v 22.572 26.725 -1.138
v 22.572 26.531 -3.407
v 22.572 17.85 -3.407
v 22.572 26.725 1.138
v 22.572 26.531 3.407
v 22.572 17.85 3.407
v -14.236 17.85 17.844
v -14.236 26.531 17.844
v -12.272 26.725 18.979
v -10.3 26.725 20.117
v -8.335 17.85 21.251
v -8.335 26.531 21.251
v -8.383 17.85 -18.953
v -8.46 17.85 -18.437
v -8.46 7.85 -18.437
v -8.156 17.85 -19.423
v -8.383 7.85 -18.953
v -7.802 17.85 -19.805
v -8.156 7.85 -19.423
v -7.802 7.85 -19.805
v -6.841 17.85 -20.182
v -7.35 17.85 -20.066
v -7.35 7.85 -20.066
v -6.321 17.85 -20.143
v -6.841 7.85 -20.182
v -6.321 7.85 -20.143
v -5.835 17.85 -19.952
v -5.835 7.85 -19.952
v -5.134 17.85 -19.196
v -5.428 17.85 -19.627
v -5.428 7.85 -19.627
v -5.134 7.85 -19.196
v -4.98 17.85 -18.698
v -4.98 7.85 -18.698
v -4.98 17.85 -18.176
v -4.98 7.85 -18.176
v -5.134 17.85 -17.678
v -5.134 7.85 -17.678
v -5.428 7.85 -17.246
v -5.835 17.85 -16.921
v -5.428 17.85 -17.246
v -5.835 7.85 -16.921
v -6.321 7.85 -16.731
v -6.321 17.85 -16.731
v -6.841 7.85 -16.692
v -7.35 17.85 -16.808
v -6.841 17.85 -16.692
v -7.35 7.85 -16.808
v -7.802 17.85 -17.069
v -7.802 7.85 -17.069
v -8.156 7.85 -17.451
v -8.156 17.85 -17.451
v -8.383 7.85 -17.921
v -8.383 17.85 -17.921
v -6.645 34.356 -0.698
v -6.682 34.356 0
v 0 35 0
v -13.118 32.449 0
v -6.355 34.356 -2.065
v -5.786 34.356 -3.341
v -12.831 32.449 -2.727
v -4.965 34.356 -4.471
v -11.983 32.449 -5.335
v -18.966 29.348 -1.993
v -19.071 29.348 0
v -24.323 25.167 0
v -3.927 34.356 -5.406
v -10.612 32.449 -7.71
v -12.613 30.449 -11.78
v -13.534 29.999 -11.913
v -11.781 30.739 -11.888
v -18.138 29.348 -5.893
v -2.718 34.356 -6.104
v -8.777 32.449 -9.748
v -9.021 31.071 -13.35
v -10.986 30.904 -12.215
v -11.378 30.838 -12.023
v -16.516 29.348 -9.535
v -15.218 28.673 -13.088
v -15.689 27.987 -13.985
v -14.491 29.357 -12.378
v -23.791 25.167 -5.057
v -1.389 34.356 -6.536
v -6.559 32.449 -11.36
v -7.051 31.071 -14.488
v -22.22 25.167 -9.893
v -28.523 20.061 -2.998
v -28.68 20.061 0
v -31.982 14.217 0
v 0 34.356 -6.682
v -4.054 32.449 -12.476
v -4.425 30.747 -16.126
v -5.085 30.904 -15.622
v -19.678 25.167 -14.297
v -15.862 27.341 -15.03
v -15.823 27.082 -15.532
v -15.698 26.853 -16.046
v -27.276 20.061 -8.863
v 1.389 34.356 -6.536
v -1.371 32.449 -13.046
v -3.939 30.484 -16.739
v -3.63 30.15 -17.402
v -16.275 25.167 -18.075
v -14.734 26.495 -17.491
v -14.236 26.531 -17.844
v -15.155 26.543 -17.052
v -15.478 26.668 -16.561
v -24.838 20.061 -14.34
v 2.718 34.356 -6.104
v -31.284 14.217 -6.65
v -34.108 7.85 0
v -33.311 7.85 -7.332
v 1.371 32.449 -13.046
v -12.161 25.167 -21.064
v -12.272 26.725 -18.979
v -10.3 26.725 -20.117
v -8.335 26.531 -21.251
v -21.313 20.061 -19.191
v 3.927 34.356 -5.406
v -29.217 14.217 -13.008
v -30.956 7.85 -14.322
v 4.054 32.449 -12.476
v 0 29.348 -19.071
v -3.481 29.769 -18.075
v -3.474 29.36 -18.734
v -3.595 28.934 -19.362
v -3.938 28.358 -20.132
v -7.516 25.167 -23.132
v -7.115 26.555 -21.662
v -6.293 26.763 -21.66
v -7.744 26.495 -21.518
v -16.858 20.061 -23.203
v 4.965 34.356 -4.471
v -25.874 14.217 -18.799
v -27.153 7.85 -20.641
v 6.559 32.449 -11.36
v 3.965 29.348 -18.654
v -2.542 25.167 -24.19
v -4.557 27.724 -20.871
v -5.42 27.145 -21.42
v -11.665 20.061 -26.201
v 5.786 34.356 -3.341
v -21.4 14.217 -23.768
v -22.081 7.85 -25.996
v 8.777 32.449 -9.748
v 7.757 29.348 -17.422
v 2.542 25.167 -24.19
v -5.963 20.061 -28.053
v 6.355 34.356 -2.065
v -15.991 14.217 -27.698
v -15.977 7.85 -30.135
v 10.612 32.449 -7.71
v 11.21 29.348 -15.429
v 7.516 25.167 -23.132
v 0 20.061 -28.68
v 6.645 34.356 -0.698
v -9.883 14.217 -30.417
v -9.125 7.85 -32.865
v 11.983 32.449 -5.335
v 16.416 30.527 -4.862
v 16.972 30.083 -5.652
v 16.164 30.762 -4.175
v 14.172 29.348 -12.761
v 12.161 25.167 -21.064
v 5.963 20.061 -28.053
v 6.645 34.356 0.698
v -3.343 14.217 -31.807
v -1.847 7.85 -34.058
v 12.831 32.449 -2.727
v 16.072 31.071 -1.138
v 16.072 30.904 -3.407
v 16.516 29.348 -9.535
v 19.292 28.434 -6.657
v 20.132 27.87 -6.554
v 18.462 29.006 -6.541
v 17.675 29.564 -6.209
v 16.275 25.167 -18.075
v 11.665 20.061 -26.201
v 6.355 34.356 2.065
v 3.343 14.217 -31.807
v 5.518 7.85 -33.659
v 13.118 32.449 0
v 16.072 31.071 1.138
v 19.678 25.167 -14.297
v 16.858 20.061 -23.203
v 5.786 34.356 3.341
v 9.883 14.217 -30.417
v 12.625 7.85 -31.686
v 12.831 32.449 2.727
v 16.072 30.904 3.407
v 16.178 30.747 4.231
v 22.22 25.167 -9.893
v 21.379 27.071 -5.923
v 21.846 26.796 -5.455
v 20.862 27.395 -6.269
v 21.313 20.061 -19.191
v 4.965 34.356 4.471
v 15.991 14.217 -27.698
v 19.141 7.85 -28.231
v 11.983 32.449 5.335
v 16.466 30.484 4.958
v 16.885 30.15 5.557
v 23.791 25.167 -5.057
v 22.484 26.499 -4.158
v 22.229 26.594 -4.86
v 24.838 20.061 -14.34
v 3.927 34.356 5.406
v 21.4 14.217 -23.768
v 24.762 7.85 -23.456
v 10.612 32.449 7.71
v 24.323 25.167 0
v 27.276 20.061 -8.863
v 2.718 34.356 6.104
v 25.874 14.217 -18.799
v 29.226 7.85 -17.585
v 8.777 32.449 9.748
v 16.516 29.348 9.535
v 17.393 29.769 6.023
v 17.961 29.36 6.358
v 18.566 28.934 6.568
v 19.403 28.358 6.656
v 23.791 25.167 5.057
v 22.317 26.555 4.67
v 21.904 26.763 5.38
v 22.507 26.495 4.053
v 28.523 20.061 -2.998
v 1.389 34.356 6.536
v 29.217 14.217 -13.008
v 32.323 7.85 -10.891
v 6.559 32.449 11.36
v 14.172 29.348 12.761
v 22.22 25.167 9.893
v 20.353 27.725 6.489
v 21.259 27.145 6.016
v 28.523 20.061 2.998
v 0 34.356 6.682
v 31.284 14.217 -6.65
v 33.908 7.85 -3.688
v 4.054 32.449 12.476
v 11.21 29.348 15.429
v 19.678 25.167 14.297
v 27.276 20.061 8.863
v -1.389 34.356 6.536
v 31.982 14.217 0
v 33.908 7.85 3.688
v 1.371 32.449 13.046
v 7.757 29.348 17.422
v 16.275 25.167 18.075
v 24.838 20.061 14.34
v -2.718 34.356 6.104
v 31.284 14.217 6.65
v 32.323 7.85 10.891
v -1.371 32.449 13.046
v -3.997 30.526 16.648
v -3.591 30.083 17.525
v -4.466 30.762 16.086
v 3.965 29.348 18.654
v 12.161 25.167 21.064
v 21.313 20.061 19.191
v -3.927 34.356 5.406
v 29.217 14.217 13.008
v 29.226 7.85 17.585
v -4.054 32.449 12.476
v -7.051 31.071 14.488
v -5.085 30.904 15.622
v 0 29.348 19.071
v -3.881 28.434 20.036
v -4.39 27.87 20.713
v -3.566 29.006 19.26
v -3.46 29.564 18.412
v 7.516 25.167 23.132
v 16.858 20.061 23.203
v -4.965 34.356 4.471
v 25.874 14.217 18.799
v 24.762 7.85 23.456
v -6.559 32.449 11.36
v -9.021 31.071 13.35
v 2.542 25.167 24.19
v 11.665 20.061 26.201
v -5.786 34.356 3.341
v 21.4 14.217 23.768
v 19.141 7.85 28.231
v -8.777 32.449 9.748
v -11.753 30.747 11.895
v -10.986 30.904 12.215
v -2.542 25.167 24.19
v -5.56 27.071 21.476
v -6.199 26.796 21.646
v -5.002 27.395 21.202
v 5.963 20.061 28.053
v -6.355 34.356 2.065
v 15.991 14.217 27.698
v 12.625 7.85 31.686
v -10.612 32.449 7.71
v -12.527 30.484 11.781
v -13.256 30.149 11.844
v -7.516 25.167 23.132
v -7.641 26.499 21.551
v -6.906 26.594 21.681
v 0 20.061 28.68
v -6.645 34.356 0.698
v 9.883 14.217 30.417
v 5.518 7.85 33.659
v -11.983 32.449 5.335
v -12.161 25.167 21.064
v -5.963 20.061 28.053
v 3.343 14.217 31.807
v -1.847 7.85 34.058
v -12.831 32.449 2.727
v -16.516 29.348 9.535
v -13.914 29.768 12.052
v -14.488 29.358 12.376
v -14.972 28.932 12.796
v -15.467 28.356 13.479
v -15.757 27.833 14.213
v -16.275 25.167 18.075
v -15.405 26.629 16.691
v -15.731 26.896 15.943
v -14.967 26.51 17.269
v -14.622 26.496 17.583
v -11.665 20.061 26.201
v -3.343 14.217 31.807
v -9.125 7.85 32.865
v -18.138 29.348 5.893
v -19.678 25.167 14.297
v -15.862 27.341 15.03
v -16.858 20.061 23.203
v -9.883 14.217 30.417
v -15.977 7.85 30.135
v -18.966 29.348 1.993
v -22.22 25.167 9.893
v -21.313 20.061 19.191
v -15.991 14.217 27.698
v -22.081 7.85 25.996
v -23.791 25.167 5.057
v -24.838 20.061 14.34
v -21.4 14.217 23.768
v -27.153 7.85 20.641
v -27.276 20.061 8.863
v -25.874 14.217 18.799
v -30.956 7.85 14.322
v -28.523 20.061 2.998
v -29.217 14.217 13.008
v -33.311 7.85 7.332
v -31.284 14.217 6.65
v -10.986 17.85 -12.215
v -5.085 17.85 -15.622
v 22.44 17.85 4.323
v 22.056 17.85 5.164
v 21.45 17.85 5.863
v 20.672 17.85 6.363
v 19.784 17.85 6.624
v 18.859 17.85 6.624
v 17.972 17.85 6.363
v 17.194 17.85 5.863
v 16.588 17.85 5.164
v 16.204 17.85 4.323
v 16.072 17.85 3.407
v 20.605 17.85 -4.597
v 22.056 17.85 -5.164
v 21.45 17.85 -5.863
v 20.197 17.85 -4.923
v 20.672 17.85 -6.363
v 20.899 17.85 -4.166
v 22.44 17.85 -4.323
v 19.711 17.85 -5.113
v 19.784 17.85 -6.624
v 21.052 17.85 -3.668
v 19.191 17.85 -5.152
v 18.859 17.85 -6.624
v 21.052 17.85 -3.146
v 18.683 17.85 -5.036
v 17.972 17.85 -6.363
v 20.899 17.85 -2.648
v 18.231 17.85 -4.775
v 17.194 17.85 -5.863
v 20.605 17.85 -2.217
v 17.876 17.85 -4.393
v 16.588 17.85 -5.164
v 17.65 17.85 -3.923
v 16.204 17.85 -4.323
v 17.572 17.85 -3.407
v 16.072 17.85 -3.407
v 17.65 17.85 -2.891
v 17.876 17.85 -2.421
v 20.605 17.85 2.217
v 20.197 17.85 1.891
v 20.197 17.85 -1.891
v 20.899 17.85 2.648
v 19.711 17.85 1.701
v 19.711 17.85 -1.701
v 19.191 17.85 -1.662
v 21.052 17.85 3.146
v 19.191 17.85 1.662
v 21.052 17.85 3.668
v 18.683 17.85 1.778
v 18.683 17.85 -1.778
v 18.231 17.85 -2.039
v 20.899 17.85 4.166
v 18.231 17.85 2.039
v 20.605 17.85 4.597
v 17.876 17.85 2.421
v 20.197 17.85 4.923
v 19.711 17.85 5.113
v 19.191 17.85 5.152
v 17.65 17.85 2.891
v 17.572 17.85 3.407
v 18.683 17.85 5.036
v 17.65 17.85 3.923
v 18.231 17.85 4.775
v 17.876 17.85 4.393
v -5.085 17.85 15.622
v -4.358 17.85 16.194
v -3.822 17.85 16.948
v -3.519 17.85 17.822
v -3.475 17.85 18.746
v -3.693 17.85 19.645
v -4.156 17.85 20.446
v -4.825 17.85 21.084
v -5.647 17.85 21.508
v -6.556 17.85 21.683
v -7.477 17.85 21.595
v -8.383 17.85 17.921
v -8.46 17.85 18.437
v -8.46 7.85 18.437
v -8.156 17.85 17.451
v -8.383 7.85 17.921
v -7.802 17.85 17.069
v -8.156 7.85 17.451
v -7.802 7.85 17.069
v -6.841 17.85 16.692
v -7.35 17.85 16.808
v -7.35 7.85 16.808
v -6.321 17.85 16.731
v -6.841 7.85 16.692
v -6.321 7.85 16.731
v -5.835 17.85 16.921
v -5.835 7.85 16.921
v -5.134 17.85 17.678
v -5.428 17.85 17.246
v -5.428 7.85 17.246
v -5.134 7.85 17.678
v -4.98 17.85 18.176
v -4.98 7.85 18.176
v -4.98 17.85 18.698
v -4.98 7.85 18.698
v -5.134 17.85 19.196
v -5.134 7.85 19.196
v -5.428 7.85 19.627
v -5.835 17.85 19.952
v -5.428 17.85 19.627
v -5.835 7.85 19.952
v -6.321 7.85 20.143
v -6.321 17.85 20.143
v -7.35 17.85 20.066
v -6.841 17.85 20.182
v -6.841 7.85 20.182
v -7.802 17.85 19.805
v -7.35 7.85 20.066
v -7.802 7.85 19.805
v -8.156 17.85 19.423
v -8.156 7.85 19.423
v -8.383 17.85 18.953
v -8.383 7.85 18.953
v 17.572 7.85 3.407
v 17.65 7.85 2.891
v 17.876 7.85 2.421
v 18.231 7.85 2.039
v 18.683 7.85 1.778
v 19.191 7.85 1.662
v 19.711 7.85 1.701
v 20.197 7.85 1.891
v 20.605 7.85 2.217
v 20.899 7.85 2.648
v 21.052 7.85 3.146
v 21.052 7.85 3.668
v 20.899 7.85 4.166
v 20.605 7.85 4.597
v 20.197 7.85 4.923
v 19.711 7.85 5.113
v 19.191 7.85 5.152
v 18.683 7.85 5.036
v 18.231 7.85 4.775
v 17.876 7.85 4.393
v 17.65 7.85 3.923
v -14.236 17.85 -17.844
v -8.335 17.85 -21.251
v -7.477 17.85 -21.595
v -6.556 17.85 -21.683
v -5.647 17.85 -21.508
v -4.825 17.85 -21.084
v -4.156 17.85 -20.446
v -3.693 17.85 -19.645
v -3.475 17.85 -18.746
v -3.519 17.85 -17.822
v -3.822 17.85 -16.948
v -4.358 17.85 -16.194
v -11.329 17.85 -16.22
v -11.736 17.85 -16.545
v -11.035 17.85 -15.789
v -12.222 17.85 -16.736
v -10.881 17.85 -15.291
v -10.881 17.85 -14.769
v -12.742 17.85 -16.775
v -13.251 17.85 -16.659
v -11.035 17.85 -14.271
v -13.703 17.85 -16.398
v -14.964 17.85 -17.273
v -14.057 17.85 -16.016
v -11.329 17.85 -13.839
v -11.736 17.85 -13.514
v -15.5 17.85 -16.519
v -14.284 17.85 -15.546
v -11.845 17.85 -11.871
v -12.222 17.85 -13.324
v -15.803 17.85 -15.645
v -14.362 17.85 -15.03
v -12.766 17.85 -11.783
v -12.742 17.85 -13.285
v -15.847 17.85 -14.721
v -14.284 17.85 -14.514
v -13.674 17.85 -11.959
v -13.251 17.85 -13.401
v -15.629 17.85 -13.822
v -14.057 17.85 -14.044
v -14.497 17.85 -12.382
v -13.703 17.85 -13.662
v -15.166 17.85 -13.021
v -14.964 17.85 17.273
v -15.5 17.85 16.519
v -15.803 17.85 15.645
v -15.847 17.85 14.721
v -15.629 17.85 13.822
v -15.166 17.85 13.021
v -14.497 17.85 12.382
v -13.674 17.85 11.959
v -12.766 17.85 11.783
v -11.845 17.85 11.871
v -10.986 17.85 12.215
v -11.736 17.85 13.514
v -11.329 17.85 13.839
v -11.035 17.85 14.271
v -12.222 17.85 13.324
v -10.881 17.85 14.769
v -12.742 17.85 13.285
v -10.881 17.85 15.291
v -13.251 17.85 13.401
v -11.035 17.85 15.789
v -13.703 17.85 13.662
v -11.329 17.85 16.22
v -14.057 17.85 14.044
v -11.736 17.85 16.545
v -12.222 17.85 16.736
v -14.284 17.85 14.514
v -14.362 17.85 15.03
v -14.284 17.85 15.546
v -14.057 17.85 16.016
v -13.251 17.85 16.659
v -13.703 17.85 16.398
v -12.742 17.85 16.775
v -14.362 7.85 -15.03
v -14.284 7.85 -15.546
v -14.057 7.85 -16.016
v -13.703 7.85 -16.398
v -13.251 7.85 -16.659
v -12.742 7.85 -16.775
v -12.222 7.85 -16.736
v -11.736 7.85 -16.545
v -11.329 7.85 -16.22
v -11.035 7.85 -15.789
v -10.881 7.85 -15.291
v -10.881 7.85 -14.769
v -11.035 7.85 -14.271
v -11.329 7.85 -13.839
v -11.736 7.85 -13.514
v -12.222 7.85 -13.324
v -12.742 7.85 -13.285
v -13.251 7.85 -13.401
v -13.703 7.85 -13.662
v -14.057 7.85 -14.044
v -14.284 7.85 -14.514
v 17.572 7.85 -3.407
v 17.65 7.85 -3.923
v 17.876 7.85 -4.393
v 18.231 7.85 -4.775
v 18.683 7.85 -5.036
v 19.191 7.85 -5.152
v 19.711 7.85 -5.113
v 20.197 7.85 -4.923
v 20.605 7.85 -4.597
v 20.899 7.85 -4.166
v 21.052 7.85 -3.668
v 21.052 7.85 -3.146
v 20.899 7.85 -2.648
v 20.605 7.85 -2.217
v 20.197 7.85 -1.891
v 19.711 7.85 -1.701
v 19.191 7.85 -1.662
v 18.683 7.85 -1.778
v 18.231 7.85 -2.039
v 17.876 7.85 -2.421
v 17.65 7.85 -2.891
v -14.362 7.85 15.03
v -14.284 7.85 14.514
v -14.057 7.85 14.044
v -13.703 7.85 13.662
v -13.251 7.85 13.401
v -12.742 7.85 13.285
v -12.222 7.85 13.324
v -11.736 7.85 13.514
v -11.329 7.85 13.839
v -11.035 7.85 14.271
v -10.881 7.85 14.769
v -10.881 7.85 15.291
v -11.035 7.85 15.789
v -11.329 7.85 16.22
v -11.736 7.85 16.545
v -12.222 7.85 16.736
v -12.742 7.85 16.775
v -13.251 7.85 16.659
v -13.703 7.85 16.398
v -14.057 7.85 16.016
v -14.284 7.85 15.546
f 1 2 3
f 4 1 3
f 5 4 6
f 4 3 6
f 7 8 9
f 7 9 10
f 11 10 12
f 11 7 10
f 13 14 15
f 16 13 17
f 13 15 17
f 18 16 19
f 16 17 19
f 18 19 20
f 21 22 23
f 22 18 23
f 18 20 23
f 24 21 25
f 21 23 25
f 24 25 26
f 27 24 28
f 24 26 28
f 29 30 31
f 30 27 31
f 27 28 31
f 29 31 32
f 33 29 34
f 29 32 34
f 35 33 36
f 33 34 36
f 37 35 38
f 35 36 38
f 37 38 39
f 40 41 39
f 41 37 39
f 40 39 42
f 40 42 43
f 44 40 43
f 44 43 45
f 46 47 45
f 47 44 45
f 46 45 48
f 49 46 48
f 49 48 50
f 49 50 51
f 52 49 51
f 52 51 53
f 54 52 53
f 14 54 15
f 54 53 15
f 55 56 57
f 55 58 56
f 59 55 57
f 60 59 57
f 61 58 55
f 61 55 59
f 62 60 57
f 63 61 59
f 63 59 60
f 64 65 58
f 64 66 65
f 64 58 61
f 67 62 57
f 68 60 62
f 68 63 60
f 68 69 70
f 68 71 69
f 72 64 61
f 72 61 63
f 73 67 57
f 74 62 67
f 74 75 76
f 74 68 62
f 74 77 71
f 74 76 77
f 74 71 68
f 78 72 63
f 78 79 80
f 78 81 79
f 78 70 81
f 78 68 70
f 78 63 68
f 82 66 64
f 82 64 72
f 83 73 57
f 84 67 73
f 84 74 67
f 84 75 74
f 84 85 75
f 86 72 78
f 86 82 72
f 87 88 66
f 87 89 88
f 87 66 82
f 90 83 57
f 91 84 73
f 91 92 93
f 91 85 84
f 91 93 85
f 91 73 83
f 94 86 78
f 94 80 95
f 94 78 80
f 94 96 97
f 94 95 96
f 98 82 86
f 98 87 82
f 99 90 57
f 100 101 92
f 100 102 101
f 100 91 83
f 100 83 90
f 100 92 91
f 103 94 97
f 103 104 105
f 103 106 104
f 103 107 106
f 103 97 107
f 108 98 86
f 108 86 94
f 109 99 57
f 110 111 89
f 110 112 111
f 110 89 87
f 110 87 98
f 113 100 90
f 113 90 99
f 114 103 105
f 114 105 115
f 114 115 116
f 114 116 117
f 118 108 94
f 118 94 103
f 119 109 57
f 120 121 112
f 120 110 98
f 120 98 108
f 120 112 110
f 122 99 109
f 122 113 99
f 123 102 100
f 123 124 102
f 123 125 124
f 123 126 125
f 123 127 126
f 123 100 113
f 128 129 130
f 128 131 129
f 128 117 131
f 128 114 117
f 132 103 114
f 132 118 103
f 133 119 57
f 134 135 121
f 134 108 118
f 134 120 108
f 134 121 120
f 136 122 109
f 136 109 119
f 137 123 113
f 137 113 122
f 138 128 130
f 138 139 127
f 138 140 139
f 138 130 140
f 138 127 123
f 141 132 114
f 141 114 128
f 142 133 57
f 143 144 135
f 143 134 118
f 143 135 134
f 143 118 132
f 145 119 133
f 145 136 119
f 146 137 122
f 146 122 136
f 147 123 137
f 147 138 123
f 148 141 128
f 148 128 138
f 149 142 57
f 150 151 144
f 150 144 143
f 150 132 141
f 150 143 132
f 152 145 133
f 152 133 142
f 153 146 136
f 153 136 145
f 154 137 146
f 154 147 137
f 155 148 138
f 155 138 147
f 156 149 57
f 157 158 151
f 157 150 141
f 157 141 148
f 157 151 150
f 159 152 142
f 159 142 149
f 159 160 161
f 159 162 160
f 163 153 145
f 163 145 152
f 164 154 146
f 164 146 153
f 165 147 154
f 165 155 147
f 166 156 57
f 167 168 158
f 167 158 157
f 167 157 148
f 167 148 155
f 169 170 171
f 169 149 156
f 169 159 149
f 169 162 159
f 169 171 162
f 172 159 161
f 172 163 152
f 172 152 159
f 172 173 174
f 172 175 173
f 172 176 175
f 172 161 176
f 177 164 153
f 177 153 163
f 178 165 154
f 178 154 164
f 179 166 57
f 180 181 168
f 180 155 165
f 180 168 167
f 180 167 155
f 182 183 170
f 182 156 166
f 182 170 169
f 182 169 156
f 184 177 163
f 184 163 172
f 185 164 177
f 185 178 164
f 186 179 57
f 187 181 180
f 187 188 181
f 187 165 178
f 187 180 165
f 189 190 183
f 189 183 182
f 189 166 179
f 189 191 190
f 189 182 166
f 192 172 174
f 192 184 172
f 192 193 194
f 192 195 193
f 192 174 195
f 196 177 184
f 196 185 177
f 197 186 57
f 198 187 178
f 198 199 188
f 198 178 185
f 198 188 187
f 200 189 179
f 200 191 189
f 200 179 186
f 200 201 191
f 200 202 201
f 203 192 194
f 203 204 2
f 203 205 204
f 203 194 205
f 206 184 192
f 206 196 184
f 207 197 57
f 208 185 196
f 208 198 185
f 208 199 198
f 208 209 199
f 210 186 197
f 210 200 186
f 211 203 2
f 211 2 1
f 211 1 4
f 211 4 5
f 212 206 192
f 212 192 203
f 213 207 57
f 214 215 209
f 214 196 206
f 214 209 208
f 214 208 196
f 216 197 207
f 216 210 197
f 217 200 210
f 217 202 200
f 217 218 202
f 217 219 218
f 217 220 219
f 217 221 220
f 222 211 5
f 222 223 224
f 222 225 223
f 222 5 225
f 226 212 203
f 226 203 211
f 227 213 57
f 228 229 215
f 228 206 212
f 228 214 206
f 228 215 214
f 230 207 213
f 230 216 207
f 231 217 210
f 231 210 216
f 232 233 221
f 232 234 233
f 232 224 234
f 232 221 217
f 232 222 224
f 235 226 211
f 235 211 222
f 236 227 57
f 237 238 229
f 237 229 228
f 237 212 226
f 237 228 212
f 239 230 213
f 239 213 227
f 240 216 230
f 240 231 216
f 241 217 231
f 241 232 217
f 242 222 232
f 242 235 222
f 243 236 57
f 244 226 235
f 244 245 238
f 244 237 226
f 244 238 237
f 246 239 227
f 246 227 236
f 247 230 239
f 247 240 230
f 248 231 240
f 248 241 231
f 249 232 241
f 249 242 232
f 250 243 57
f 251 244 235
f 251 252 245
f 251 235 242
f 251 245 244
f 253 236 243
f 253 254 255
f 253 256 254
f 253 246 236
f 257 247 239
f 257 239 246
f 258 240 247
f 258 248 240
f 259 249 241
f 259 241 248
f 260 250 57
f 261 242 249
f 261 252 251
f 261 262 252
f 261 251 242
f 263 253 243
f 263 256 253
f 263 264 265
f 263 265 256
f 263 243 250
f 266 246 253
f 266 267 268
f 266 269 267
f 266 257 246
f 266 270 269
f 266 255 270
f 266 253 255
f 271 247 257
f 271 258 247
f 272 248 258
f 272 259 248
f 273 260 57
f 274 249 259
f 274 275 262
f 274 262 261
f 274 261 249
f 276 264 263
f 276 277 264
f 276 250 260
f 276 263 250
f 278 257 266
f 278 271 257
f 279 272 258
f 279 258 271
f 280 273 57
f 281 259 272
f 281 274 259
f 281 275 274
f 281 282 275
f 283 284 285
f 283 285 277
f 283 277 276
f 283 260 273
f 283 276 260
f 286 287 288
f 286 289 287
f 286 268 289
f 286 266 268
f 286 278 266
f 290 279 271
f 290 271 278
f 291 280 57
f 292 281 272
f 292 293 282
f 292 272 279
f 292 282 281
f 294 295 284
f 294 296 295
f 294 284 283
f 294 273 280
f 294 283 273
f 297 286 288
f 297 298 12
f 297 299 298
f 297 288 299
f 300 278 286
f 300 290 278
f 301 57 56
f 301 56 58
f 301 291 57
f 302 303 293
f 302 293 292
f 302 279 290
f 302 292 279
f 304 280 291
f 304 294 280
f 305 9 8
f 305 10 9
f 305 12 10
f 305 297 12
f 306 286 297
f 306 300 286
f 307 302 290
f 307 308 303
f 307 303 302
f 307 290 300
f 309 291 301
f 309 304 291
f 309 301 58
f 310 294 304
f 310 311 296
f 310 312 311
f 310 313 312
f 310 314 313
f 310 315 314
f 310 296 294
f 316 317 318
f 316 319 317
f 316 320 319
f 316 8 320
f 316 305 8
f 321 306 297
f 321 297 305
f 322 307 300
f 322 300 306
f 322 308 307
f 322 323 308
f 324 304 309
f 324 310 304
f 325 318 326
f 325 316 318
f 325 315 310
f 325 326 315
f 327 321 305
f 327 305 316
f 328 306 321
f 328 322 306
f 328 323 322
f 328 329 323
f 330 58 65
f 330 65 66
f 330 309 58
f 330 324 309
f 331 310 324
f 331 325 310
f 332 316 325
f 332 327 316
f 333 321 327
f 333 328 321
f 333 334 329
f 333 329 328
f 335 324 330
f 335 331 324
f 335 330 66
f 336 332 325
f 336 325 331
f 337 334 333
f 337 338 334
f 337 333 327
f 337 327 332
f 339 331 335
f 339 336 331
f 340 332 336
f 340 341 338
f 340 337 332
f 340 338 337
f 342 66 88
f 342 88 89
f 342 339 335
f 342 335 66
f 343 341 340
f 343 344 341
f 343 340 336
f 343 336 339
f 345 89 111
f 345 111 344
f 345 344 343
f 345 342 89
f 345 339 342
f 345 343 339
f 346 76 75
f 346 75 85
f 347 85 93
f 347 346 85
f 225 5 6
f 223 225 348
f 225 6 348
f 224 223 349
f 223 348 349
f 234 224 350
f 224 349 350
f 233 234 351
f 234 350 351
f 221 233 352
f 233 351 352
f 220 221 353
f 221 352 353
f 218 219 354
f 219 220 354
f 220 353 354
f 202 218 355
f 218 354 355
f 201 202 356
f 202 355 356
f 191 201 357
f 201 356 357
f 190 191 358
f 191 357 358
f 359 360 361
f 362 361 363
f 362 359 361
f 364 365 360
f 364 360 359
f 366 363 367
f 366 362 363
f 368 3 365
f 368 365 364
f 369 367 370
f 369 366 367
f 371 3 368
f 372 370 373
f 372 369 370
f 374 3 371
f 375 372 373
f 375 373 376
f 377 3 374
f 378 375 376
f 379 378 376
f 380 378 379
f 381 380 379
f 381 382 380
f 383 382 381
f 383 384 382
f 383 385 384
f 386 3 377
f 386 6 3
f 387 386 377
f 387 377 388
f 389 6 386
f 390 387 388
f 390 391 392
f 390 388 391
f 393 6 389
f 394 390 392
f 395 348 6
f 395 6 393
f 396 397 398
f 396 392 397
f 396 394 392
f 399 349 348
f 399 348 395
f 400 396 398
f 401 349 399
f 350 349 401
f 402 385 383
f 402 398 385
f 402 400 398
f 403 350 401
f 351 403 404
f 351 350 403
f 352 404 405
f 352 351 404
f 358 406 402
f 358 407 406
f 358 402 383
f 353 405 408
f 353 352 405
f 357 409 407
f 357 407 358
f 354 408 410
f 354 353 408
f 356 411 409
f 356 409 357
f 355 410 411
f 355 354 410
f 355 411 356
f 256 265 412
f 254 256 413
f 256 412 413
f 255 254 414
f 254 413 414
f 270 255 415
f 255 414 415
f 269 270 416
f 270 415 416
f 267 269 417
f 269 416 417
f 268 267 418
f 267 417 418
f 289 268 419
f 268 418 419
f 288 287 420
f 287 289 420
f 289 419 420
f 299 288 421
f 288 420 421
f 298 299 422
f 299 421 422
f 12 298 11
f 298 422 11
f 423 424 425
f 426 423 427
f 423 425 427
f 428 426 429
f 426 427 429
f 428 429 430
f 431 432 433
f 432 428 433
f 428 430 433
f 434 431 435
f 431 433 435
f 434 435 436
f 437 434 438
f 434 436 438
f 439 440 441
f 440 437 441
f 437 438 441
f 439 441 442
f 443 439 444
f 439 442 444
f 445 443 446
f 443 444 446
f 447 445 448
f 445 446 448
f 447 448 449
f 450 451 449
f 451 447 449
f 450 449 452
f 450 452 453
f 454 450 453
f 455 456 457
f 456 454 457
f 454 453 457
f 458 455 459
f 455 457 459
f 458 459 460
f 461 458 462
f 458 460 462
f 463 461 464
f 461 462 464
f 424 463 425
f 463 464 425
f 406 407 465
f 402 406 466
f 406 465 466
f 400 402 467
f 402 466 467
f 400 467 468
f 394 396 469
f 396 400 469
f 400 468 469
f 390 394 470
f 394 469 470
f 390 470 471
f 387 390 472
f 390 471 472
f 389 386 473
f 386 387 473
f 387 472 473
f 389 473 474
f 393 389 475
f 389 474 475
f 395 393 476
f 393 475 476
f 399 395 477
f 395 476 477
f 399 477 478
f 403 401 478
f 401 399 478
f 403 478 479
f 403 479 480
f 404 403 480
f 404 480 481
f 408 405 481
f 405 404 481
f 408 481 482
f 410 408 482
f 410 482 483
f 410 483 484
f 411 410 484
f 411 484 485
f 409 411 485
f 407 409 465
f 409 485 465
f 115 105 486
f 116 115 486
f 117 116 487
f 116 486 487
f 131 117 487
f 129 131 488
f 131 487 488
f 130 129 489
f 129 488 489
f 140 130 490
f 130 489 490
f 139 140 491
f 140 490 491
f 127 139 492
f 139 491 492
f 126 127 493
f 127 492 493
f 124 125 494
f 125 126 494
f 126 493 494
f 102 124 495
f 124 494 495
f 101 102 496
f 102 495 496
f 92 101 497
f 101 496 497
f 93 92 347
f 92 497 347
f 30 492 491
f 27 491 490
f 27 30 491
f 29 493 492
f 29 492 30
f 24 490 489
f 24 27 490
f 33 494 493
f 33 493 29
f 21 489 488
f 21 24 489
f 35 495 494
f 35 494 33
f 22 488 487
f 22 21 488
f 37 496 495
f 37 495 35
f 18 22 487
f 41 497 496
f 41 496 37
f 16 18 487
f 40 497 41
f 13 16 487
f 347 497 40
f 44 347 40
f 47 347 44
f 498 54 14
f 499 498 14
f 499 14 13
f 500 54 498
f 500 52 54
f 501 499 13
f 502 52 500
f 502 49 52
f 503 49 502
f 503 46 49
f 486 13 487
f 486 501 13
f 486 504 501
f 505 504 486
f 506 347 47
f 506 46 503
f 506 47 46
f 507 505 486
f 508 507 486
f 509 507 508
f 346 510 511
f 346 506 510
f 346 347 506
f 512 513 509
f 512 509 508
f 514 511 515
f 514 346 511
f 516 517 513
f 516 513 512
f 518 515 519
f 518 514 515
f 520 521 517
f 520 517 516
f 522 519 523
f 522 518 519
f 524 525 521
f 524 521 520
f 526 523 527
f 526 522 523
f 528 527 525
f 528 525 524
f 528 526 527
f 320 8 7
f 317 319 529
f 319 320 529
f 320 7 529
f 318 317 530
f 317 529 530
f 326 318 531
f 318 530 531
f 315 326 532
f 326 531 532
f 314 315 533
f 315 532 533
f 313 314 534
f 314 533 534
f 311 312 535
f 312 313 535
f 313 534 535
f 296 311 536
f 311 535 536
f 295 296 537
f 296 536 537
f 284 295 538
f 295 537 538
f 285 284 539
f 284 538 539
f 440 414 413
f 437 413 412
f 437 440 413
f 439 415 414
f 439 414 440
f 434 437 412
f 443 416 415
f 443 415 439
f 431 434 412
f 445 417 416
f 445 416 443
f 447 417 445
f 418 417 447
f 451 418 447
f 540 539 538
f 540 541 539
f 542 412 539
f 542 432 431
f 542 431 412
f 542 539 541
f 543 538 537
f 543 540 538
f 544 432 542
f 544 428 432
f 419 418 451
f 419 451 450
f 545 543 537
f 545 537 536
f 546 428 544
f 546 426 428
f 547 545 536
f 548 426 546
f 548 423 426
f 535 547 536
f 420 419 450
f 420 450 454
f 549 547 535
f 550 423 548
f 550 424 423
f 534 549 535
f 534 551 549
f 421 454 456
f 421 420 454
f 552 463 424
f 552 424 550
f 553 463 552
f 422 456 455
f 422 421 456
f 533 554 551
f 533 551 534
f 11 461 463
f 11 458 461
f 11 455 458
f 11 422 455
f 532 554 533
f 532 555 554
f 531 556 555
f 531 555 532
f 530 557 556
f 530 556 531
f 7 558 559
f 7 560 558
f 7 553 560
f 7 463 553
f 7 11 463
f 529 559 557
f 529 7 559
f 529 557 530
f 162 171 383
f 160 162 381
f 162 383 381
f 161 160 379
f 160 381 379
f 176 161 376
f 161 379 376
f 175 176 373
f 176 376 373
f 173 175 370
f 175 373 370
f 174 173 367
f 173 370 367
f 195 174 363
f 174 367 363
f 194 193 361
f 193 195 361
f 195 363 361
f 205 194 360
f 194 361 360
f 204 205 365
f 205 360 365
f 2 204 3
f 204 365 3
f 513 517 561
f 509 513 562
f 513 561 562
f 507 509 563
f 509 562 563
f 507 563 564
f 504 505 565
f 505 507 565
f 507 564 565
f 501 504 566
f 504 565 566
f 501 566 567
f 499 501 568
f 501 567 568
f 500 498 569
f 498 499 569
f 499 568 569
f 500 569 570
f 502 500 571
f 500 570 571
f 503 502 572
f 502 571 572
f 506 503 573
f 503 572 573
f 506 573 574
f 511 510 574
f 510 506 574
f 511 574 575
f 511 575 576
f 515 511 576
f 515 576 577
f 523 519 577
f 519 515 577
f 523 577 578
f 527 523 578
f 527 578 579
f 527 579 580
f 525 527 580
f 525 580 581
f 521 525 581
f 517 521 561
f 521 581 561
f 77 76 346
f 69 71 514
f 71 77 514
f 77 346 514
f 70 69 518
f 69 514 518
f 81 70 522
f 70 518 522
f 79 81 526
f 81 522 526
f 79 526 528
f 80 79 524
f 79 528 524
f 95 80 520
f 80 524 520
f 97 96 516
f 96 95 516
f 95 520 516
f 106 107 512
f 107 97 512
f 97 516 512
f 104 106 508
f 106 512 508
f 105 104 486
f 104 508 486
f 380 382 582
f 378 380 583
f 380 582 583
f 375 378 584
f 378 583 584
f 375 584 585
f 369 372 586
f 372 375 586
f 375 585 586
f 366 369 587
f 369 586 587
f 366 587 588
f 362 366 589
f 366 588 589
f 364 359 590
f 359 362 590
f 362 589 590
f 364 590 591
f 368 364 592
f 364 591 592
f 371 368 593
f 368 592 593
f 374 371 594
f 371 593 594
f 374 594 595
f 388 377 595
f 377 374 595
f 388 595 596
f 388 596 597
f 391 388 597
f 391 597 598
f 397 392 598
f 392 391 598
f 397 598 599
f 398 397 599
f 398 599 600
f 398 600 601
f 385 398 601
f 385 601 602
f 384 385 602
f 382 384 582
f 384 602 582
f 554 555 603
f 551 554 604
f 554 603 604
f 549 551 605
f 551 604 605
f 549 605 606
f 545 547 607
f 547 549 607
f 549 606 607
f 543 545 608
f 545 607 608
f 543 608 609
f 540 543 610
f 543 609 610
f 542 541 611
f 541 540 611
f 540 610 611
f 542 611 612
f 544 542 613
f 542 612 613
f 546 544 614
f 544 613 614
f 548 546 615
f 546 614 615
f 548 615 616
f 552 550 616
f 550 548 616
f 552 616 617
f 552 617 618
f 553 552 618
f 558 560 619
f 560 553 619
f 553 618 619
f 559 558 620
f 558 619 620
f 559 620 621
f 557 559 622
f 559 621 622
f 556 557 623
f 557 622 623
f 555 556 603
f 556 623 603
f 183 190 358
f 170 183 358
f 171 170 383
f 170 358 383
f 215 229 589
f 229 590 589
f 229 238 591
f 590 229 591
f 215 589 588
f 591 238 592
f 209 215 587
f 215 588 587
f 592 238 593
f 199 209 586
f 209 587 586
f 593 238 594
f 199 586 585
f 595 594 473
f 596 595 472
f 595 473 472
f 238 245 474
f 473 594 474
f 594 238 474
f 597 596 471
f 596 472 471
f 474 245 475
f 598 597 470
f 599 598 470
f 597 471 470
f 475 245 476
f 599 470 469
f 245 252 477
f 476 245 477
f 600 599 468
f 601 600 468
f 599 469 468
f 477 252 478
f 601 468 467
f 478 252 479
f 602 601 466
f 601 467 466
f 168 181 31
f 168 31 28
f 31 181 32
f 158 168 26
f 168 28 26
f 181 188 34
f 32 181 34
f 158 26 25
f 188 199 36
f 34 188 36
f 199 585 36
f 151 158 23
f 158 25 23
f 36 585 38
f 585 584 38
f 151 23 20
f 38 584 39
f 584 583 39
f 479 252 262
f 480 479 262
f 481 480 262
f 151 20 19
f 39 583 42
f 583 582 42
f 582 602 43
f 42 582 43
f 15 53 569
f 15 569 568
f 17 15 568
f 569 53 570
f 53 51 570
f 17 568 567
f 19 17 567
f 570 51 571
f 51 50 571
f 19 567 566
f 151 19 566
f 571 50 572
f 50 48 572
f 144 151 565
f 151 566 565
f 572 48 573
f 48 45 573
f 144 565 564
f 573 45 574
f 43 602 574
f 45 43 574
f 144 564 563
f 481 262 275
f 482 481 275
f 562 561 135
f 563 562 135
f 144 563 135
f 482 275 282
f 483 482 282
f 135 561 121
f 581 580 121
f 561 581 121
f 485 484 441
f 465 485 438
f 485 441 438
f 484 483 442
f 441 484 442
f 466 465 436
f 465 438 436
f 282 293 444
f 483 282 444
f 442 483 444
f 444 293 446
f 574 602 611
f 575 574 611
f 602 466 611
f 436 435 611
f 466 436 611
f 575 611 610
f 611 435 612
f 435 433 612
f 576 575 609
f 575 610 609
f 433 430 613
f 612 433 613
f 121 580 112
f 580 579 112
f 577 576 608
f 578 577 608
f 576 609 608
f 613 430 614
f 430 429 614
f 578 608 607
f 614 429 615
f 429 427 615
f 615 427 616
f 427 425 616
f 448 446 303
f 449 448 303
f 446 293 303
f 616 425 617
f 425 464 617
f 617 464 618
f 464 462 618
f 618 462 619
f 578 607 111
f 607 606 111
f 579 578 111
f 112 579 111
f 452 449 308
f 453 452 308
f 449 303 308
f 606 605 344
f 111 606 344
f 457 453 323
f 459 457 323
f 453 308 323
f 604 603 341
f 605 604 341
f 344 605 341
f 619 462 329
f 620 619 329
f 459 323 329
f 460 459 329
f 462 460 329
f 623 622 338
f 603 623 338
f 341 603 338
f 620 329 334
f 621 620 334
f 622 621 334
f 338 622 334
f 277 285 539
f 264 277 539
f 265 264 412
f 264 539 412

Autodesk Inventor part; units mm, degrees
ref_plane "YZ Plane" through (0, 0, 0) normal (1, 0, 0) x (0, 1, 0)
ref_plane "XZ Plane" through (0, 0, 0) normal (0, 1, 0) x (-1, 0, 0)
ref_plane "XY Plane" through (0, 0, 0) normal (0, 0, 1) x (1, 0, 0)
sketch "Szkic1" plane through (0, 0, 0) normal (0, 1, 0) x (-1, 0, 0)
  circle A0 centre (0, 0) radius 19.62 construction
  line L0 (0, 0) -> (-19.62, 0) construction
  circle A1 centre (0, 0) radius 22.5 construction
  circle A2 centre (-19.3219, 3.407) radius 1.75
  circle A3 centre (-19.3219, -3.407) radius 1.75
  circle A4 centre (6.7104, 18.4368) radius 1.75
  circle A5 centre (12.6115, 15.0298) radius 1.75
  circle A6 centre (12.6115, -15.0298) radius 1.75
  circle A7 centre (6.7104, -18.4368) radius 1.75
  circle A8 centre (0, 0) radius 35
  circle A9 centre (-19.3219, 3.407) radius 3.25
  circle A10 centre (-19.3219, -3.407) radius 3.25
  circle A11 centre (6.7104, -18.4368) radius 3.25
  circle A12 centre (12.6115, -15.0298) radius 3.25
  circle A13 centre (12.6115, 15.0298) radius 3.25
  circle A14 centre (6.7104, 18.4368) radius 3.25
  line L1 (14.2365, 17.8444) -> (8.3354, 21.2514)
  line L2 (10.9865, 12.2152) -> (5.0854, 15.6222)
  line L3 (-16.0719, 3.407) -> (-16.0719, -3.407)
  line L4 (14.2365, -17.8444) -> (8.3354, -21.2514)
  line L5 (10.9865, -12.2152) -> (5.0854, -15.6222)
  line L6 (-22.5719, -3.407) -> (-22.5719, 3.407)
  dimension "d0" = 39.24
  dimension "d1" = 3.5
  dimension "d2" = 20
  dimension "d5" = 360
  dimension "d7" = 45
  dimension "d8" = 70
  dimension "d12" = 6.5
  dimension "d15" = 360
sketch "Szkic3" plane through (0, 0, 0) normal (0, 0, 1) x (1, 0, 0)
  arc A0 (0, 35) -> (-35, 0) centre (0, 0) ccw
  line L0 (0, 35) -> (0, 0)
  line L1 (0, 0) -> (-35, 0)
  line L2 (0, -8.4497) -> (0, 50.6985) projected
  dimension "d19" = 35
revolve "Obrót1" add sketch "Szkic3" angle 360 about axis through (0, -10, 0) along (0, 1, 0)
extrude "Wyciągnięcie proste1" cut sketch "Szkic1" along normal through all contours A2 | A3 | A4 | A5 | A6 | A7 | A9 | L3 A10 L6 A9 | A10 | A11 | A11 L5 A12 L4 | A12 | A13 | A13 L2 A14 L1 | A14
extrude "Wyciągnięcie proste2" add sketch "Szkic1" along normal blind 17.85 contours A9 | L3 A10 L6 A9 | A10 | A11 | A11 L5 A12 L4 | A12 | A13 | A13 L2 A14 L1 | A14
extrude "Wyciągnięcie proste3" cut sketch "Szkic1" along normal blind 7.85 contours A2 | A3 | A4 | A5 | A6 | A7 | A8 | A9 | L3 A10 L6 A9 | A10 | A11 | A11 L5 A12 L4 | A12 | A13 | A13 L2 A14 L1 | A14
ref_plane "Płaszczyzna konstrukcyjna2" through (-11.286, 17.85, -19.5479) normal (-0.866, 0, 0.5) x (0.5, 0, 0.866)
properties part number "hemisphere_1"
